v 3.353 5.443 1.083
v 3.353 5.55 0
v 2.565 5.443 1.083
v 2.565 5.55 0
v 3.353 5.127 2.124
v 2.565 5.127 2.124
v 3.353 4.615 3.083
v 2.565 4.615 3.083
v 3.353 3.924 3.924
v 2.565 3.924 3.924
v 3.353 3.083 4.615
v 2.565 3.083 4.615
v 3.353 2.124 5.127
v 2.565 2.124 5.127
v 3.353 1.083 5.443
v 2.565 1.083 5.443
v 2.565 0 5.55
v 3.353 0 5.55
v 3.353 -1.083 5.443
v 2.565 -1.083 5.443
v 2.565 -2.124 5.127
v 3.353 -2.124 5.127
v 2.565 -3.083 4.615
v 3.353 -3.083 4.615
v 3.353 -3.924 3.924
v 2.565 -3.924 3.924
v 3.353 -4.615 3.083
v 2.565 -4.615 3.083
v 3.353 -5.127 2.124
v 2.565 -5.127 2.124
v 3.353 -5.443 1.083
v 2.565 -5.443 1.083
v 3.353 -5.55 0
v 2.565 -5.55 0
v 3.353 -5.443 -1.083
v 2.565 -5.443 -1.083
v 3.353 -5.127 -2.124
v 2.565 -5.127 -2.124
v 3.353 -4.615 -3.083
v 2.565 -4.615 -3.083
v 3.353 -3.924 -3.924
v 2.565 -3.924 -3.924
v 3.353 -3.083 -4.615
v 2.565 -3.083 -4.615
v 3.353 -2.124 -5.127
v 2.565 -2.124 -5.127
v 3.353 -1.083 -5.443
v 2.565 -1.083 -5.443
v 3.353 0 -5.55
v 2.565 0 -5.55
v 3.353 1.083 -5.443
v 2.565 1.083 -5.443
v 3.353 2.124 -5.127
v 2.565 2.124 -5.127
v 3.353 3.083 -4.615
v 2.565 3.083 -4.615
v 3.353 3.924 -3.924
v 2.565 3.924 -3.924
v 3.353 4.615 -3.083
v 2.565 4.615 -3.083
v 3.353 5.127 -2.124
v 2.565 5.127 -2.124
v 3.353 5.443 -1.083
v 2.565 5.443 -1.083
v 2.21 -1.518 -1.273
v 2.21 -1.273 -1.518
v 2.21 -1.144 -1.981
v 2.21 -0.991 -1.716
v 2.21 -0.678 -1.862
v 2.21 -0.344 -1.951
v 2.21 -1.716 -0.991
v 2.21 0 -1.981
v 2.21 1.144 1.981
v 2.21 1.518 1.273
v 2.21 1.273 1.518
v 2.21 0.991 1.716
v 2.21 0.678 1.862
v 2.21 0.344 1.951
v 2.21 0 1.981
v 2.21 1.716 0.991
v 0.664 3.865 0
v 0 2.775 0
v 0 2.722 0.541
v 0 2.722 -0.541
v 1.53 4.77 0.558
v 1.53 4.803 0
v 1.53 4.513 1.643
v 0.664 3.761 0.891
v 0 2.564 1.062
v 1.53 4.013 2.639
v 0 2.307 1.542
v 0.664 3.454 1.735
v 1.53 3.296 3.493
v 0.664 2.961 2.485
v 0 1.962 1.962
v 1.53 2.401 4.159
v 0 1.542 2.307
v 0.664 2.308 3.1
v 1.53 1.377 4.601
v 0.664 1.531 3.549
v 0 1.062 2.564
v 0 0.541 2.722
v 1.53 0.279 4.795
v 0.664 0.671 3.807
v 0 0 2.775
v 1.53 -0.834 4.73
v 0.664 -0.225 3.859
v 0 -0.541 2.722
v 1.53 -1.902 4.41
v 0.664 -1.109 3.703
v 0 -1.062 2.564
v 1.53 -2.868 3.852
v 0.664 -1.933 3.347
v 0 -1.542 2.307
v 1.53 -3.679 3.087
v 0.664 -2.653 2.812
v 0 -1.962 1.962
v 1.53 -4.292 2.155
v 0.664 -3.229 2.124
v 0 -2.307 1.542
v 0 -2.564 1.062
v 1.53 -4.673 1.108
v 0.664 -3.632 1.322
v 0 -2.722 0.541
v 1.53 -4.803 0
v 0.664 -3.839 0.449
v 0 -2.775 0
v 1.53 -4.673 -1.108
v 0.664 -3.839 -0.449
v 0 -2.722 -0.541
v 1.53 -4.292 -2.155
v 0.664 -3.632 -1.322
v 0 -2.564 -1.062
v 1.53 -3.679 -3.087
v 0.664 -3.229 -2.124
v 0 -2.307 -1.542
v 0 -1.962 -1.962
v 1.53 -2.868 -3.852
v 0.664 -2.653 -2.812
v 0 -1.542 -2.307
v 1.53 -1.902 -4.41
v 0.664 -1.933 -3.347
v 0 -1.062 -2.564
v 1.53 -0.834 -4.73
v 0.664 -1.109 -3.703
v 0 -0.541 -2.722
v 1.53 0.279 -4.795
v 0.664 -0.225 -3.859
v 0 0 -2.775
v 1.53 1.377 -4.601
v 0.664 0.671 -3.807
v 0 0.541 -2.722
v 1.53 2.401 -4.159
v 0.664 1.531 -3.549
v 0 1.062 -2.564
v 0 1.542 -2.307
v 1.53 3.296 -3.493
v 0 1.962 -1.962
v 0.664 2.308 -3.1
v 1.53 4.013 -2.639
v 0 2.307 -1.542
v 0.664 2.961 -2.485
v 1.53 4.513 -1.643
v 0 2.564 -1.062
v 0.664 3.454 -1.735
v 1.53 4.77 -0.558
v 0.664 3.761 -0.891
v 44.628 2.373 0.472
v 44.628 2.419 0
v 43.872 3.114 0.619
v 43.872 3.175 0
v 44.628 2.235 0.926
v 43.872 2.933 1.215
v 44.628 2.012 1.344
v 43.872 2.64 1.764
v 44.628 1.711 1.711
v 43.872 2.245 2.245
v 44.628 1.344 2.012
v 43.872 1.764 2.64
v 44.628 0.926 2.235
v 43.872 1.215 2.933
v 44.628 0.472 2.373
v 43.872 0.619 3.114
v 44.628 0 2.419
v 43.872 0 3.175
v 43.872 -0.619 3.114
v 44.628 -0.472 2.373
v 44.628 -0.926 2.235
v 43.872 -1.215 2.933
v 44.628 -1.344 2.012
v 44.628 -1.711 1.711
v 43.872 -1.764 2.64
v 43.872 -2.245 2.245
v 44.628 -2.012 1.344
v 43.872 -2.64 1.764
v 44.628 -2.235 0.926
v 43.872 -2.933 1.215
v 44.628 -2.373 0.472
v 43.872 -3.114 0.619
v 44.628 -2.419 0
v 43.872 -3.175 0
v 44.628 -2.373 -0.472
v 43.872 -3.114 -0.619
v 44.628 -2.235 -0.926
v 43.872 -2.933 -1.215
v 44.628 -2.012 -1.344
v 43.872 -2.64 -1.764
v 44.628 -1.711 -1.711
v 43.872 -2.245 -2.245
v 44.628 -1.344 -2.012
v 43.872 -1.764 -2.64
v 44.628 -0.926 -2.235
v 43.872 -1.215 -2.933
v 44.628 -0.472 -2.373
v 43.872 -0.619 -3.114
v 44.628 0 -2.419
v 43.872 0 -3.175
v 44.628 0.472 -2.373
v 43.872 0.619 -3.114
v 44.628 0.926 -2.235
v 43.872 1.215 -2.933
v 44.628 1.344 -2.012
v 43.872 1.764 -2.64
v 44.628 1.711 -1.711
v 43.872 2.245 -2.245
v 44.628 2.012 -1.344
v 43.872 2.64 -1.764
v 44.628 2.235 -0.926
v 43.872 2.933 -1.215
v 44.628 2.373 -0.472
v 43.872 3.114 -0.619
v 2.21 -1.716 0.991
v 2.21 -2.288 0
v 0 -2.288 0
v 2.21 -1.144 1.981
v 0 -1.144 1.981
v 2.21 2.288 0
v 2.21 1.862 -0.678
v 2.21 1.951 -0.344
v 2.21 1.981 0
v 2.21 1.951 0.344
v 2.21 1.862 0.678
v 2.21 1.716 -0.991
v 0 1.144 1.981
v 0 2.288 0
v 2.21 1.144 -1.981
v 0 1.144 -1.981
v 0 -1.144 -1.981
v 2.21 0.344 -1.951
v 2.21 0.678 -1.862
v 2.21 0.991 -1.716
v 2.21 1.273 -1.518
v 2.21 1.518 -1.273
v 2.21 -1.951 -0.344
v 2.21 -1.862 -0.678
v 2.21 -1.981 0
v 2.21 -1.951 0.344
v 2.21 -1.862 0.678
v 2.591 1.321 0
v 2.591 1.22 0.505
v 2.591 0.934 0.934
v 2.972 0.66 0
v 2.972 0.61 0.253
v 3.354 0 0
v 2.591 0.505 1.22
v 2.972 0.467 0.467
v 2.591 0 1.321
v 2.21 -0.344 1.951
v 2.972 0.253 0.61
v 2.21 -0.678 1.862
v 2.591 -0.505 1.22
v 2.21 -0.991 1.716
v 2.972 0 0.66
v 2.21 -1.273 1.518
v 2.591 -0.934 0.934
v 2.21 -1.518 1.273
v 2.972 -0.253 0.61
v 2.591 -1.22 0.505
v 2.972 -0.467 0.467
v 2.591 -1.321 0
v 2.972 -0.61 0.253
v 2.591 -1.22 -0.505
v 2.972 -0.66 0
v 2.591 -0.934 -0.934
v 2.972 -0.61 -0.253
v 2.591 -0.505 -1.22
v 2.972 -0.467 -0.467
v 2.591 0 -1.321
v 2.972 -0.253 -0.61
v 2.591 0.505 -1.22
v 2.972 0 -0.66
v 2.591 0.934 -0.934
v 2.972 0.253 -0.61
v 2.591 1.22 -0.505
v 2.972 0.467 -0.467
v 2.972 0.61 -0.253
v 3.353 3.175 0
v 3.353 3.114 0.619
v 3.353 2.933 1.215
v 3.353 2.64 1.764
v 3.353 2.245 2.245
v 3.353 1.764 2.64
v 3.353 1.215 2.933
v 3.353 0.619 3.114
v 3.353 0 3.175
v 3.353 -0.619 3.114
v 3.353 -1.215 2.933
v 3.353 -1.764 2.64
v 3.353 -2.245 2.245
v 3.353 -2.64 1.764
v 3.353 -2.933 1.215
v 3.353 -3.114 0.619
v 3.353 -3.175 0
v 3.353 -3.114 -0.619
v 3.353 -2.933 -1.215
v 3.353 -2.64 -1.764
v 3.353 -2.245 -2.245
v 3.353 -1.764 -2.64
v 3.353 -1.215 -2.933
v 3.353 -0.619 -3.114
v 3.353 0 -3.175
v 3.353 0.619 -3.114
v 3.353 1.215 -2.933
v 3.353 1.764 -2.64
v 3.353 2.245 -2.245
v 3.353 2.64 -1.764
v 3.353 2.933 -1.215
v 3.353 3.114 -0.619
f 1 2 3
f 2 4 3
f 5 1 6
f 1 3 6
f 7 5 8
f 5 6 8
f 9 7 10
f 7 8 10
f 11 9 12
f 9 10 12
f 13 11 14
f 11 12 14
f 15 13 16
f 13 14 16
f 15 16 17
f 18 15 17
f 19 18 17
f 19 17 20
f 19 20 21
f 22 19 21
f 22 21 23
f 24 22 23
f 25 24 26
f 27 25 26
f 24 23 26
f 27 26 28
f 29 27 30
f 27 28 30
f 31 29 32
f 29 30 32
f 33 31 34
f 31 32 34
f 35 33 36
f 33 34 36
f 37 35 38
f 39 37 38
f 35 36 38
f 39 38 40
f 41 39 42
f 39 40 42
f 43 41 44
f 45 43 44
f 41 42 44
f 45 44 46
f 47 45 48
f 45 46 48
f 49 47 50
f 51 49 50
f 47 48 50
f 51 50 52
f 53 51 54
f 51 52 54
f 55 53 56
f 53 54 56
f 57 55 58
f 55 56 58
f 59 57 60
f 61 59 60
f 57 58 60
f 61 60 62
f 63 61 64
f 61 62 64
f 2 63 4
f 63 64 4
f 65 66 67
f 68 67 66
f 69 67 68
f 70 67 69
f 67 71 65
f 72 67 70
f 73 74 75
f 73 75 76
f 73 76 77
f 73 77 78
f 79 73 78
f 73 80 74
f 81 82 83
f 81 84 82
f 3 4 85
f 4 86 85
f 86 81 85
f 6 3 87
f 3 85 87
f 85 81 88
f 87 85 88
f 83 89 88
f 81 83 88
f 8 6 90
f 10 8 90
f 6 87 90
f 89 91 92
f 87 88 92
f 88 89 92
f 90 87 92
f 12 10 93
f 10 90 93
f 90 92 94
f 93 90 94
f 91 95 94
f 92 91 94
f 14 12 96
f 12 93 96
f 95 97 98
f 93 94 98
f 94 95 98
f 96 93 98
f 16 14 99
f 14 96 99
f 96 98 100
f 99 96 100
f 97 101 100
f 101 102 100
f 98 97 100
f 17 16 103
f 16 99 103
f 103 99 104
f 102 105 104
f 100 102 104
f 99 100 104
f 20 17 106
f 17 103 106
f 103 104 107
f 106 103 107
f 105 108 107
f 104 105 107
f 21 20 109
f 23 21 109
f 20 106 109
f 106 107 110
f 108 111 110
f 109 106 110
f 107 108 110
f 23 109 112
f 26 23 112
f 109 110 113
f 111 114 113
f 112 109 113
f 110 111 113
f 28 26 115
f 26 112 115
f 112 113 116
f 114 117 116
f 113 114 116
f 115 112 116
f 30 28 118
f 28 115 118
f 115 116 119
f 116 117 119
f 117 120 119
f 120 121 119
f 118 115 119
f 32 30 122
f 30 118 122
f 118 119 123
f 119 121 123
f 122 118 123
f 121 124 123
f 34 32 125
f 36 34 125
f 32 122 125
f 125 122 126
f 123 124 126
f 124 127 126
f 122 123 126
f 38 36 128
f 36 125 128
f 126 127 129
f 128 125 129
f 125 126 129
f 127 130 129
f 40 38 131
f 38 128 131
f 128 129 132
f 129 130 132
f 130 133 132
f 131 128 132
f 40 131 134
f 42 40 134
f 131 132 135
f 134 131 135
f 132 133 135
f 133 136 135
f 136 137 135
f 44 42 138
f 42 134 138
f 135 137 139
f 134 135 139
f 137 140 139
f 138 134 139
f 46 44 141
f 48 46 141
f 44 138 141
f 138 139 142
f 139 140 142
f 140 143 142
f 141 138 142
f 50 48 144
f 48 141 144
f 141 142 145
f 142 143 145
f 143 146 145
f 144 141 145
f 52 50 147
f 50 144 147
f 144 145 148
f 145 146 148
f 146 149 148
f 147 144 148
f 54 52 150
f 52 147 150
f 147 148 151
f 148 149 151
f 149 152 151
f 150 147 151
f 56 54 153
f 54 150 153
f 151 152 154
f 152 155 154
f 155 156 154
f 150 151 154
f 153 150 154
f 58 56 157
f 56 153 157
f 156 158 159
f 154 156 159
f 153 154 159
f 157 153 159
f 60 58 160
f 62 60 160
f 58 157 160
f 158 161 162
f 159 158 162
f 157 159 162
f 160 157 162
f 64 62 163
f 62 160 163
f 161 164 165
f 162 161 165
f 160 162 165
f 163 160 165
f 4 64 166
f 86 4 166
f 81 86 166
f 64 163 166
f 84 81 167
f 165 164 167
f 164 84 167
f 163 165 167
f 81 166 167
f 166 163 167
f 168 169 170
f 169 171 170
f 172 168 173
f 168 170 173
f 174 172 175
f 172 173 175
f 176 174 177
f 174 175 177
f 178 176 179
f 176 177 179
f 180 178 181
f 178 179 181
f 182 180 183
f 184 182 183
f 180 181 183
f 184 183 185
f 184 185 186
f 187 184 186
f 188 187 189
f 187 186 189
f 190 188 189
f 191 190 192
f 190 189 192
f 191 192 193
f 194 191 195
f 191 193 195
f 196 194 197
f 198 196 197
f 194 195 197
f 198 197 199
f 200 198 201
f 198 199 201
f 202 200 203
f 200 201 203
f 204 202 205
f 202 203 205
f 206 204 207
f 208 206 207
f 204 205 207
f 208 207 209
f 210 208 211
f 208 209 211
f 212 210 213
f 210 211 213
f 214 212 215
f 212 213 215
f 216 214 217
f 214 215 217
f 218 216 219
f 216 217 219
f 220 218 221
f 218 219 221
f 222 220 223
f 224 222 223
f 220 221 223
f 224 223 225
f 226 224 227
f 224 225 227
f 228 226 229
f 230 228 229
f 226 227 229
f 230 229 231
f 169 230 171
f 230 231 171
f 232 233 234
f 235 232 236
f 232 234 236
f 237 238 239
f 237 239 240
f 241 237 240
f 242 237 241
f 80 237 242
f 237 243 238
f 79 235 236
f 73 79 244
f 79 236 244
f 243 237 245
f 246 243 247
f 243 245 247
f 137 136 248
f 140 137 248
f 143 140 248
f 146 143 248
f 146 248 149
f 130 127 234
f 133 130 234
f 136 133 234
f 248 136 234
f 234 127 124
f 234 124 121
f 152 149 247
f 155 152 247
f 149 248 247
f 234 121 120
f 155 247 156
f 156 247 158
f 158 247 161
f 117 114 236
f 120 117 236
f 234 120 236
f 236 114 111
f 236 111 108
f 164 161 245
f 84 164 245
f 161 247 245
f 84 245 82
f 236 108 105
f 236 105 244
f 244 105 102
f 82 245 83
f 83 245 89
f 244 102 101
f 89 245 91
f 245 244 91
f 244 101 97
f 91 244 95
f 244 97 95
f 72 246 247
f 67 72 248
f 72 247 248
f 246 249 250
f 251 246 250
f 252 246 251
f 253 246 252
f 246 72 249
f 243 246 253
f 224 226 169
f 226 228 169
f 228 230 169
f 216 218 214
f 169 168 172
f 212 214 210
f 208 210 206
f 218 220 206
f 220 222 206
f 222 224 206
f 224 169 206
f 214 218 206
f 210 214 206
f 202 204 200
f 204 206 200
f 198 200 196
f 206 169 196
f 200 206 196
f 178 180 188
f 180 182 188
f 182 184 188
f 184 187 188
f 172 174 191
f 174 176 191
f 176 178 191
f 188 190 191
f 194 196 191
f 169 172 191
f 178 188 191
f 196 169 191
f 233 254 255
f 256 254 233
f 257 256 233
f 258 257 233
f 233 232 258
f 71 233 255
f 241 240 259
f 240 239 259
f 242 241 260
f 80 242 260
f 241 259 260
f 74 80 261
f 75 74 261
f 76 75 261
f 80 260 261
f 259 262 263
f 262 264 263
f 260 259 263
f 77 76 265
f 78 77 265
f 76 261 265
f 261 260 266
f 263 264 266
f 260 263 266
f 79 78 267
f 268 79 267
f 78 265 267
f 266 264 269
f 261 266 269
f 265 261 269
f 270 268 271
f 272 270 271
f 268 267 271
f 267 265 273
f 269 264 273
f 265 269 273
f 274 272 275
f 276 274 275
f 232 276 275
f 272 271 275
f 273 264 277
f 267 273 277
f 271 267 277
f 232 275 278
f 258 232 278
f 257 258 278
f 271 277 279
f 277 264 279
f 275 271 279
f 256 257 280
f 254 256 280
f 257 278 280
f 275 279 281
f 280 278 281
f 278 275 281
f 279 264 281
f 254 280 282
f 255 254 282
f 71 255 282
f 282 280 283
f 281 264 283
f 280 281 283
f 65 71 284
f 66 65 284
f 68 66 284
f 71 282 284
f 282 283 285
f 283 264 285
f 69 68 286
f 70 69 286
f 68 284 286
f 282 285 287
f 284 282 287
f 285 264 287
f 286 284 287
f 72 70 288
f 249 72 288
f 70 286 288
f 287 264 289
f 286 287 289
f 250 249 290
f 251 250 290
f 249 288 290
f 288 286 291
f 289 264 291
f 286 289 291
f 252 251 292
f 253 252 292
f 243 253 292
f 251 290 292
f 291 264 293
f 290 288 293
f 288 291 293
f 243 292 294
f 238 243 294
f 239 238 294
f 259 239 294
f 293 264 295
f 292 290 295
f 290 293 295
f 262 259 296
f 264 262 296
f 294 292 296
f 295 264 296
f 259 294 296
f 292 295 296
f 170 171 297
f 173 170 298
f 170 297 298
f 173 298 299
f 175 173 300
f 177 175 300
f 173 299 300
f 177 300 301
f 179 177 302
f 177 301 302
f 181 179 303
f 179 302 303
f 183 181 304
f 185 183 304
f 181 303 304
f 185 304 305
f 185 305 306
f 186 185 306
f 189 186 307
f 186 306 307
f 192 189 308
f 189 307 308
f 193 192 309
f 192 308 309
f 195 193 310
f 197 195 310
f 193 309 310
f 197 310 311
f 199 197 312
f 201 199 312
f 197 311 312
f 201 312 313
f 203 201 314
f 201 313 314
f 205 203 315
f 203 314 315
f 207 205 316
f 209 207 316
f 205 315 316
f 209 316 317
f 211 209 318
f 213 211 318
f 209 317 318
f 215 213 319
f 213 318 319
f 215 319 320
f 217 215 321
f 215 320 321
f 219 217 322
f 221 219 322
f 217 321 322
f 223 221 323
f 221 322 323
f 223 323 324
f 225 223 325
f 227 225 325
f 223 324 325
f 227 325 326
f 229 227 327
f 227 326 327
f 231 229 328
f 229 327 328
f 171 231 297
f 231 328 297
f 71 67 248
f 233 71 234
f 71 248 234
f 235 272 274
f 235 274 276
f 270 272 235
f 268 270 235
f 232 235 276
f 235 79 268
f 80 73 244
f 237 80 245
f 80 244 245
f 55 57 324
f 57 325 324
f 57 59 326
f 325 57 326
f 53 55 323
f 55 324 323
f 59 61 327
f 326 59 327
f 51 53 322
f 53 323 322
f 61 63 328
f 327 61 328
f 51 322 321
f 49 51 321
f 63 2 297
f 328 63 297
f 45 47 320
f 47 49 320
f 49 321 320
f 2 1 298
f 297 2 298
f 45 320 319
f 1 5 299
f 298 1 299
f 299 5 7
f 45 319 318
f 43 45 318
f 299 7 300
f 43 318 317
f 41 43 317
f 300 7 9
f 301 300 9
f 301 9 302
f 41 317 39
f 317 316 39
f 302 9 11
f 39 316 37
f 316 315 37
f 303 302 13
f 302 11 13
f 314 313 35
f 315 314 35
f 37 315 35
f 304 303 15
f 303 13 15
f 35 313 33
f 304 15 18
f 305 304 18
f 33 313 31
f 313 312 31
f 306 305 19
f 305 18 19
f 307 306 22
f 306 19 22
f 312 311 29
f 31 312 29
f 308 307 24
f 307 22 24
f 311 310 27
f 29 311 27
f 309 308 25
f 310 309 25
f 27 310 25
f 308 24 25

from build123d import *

# Parameters (mm, degrees)
HEX_2_DEPTH = 2.2098


with BuildPart() as part:
    # BodySke → BaseBody (revolve)
    with BuildSketch(Plane.XY):
        with BuildLine():
            Line((44.6278, 0), (44.6278, 2.41935))
            Line((44.6278, 2.41935), (43.87215, 3.175))
            Line((43.87215, 3.175), (3.3528, 3.175))
            Line((3.3528, 3.175), (3.3528, 5.5499))
            Line((3.3528, 5.5499), (2.5654, 5.5499))
            ThreePointArc((2.5654, 5.5499), (1.073764503, 4.355582759), (0, 2.77495))
            Line((0, 2.77495), (0, 0))
            Line((0, 0), (44.6278, 0))
        make_face()
    revolve(axis=Axis((0, 0, 0), (1, 0, 0)))

    # Sketch2 → PreBroach (revolve, cut)
    with BuildSketch(Plane.XY):
        Polygon((0, 1.9812), (2.2098, 1.9812), (3.353646353, 0), (0, 0), align=None)
    revolve(axis=Axis((0, 0, 0), (1, 0, 0)), mode=Mode.SUBTRACT)

    # Sketch3 → Hex 2 (cut)
    with BuildSketch(Plane(origin=(0, 0, 0), x_dir=(0, 0, -1), z_dir=(1, 0, 0))):
        Polygon((-1.9812, -1.143846353), (-1.9812, 1.143846353), (0, 2.287692707), (1.9812, 1.143846353), (1.9812, -1.143846353), (0, -2.287692707), align=None)
    extrude(amount=HEX_2_DEPTH, mode=Mode.SUBTRACT)


solid = part.part
